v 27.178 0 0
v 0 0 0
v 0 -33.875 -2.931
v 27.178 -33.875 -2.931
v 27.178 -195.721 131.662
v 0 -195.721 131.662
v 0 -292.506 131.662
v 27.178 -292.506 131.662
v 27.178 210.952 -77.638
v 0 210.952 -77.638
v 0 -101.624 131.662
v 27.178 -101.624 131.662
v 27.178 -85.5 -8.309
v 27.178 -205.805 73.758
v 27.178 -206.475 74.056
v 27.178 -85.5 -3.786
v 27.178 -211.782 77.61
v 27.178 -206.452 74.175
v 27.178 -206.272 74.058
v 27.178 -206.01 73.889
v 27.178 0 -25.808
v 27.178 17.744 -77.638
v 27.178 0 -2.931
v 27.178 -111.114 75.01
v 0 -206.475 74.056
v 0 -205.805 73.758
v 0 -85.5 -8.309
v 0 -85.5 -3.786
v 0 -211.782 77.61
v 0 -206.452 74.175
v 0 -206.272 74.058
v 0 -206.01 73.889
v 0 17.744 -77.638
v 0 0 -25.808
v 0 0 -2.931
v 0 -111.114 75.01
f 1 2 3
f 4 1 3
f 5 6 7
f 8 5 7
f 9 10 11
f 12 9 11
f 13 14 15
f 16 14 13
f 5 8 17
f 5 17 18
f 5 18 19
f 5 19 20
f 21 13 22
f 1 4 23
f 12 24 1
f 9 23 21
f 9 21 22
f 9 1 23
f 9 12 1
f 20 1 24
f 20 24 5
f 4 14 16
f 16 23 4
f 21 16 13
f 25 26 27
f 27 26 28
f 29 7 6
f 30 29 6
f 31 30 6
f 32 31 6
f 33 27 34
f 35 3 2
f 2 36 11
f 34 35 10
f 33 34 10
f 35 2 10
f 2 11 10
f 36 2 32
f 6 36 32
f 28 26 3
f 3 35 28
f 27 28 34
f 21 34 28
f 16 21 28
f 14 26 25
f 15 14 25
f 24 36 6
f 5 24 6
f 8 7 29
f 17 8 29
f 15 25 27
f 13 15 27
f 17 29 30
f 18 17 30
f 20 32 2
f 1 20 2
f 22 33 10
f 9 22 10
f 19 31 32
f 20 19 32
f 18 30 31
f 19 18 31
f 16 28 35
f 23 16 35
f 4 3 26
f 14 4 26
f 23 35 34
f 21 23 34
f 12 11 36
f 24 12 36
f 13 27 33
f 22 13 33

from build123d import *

# Parameters (mm, degrees)
F1_DEPTH = 27.178


with BuildPart() as f1:
    # F0 (on Right) → F1 (new body)
    with BuildSketch(Plane.YZ):
        Polygon((-201.0527832023, 103.0996836883), (-111.1142710685, 75.0100706926), (-195.7207322121, 131.6622793674), align=None)
        Polygon((-111.1142710685, 75.0100706926), (-206.2715808406, 74.0581721357), (-206.0097499806, 73.8894074276), (0, 0), (210.9516762065, -77.6375151615), (-101.6242206097, 131.6622793674), align=None)
        Polygon((-206.4524721431, 74.174766749), (-206.2715808406, 74.0581721357), (-111.1142710685, 75.0100706926), (-201.0527832023, 103.0996836883), align=None)
        Polygon((-205.8051467933, 73.7575291716), (-206.4746171236, 74.0561410785), (-85.4999272821, -8.3092013374), (17.7439041436, -77.6375151615), (0, -25.8079376072), (-85.4999272821, -3.785947777), align=None)
        Polygon((-33.874746412, -2.9306560755), (-205.8051467933, 73.7575291716), (-85.4999272821, -3.785947777), (0, -2.9306560755), (0, -25.8079376072), (17.7439041436, -77.6375151615), (210.9516762065, -77.6375151615), (0, 0), align=None)
        Polygon((-292.5057113171, 131.6622793674), (-211.7819928518, 77.6099424455), (-206.4524721431, 74.174766749), (-201.0527832023, 103.0996836883), align=None)
        Polygon((-195.7207322121, 131.6622793674), (-292.5057113171, 131.6622793674), (-201.0527832023, 103.0996836883), align=None)
    extrude(amount=F1_DEPTH)


solid = f1.part
